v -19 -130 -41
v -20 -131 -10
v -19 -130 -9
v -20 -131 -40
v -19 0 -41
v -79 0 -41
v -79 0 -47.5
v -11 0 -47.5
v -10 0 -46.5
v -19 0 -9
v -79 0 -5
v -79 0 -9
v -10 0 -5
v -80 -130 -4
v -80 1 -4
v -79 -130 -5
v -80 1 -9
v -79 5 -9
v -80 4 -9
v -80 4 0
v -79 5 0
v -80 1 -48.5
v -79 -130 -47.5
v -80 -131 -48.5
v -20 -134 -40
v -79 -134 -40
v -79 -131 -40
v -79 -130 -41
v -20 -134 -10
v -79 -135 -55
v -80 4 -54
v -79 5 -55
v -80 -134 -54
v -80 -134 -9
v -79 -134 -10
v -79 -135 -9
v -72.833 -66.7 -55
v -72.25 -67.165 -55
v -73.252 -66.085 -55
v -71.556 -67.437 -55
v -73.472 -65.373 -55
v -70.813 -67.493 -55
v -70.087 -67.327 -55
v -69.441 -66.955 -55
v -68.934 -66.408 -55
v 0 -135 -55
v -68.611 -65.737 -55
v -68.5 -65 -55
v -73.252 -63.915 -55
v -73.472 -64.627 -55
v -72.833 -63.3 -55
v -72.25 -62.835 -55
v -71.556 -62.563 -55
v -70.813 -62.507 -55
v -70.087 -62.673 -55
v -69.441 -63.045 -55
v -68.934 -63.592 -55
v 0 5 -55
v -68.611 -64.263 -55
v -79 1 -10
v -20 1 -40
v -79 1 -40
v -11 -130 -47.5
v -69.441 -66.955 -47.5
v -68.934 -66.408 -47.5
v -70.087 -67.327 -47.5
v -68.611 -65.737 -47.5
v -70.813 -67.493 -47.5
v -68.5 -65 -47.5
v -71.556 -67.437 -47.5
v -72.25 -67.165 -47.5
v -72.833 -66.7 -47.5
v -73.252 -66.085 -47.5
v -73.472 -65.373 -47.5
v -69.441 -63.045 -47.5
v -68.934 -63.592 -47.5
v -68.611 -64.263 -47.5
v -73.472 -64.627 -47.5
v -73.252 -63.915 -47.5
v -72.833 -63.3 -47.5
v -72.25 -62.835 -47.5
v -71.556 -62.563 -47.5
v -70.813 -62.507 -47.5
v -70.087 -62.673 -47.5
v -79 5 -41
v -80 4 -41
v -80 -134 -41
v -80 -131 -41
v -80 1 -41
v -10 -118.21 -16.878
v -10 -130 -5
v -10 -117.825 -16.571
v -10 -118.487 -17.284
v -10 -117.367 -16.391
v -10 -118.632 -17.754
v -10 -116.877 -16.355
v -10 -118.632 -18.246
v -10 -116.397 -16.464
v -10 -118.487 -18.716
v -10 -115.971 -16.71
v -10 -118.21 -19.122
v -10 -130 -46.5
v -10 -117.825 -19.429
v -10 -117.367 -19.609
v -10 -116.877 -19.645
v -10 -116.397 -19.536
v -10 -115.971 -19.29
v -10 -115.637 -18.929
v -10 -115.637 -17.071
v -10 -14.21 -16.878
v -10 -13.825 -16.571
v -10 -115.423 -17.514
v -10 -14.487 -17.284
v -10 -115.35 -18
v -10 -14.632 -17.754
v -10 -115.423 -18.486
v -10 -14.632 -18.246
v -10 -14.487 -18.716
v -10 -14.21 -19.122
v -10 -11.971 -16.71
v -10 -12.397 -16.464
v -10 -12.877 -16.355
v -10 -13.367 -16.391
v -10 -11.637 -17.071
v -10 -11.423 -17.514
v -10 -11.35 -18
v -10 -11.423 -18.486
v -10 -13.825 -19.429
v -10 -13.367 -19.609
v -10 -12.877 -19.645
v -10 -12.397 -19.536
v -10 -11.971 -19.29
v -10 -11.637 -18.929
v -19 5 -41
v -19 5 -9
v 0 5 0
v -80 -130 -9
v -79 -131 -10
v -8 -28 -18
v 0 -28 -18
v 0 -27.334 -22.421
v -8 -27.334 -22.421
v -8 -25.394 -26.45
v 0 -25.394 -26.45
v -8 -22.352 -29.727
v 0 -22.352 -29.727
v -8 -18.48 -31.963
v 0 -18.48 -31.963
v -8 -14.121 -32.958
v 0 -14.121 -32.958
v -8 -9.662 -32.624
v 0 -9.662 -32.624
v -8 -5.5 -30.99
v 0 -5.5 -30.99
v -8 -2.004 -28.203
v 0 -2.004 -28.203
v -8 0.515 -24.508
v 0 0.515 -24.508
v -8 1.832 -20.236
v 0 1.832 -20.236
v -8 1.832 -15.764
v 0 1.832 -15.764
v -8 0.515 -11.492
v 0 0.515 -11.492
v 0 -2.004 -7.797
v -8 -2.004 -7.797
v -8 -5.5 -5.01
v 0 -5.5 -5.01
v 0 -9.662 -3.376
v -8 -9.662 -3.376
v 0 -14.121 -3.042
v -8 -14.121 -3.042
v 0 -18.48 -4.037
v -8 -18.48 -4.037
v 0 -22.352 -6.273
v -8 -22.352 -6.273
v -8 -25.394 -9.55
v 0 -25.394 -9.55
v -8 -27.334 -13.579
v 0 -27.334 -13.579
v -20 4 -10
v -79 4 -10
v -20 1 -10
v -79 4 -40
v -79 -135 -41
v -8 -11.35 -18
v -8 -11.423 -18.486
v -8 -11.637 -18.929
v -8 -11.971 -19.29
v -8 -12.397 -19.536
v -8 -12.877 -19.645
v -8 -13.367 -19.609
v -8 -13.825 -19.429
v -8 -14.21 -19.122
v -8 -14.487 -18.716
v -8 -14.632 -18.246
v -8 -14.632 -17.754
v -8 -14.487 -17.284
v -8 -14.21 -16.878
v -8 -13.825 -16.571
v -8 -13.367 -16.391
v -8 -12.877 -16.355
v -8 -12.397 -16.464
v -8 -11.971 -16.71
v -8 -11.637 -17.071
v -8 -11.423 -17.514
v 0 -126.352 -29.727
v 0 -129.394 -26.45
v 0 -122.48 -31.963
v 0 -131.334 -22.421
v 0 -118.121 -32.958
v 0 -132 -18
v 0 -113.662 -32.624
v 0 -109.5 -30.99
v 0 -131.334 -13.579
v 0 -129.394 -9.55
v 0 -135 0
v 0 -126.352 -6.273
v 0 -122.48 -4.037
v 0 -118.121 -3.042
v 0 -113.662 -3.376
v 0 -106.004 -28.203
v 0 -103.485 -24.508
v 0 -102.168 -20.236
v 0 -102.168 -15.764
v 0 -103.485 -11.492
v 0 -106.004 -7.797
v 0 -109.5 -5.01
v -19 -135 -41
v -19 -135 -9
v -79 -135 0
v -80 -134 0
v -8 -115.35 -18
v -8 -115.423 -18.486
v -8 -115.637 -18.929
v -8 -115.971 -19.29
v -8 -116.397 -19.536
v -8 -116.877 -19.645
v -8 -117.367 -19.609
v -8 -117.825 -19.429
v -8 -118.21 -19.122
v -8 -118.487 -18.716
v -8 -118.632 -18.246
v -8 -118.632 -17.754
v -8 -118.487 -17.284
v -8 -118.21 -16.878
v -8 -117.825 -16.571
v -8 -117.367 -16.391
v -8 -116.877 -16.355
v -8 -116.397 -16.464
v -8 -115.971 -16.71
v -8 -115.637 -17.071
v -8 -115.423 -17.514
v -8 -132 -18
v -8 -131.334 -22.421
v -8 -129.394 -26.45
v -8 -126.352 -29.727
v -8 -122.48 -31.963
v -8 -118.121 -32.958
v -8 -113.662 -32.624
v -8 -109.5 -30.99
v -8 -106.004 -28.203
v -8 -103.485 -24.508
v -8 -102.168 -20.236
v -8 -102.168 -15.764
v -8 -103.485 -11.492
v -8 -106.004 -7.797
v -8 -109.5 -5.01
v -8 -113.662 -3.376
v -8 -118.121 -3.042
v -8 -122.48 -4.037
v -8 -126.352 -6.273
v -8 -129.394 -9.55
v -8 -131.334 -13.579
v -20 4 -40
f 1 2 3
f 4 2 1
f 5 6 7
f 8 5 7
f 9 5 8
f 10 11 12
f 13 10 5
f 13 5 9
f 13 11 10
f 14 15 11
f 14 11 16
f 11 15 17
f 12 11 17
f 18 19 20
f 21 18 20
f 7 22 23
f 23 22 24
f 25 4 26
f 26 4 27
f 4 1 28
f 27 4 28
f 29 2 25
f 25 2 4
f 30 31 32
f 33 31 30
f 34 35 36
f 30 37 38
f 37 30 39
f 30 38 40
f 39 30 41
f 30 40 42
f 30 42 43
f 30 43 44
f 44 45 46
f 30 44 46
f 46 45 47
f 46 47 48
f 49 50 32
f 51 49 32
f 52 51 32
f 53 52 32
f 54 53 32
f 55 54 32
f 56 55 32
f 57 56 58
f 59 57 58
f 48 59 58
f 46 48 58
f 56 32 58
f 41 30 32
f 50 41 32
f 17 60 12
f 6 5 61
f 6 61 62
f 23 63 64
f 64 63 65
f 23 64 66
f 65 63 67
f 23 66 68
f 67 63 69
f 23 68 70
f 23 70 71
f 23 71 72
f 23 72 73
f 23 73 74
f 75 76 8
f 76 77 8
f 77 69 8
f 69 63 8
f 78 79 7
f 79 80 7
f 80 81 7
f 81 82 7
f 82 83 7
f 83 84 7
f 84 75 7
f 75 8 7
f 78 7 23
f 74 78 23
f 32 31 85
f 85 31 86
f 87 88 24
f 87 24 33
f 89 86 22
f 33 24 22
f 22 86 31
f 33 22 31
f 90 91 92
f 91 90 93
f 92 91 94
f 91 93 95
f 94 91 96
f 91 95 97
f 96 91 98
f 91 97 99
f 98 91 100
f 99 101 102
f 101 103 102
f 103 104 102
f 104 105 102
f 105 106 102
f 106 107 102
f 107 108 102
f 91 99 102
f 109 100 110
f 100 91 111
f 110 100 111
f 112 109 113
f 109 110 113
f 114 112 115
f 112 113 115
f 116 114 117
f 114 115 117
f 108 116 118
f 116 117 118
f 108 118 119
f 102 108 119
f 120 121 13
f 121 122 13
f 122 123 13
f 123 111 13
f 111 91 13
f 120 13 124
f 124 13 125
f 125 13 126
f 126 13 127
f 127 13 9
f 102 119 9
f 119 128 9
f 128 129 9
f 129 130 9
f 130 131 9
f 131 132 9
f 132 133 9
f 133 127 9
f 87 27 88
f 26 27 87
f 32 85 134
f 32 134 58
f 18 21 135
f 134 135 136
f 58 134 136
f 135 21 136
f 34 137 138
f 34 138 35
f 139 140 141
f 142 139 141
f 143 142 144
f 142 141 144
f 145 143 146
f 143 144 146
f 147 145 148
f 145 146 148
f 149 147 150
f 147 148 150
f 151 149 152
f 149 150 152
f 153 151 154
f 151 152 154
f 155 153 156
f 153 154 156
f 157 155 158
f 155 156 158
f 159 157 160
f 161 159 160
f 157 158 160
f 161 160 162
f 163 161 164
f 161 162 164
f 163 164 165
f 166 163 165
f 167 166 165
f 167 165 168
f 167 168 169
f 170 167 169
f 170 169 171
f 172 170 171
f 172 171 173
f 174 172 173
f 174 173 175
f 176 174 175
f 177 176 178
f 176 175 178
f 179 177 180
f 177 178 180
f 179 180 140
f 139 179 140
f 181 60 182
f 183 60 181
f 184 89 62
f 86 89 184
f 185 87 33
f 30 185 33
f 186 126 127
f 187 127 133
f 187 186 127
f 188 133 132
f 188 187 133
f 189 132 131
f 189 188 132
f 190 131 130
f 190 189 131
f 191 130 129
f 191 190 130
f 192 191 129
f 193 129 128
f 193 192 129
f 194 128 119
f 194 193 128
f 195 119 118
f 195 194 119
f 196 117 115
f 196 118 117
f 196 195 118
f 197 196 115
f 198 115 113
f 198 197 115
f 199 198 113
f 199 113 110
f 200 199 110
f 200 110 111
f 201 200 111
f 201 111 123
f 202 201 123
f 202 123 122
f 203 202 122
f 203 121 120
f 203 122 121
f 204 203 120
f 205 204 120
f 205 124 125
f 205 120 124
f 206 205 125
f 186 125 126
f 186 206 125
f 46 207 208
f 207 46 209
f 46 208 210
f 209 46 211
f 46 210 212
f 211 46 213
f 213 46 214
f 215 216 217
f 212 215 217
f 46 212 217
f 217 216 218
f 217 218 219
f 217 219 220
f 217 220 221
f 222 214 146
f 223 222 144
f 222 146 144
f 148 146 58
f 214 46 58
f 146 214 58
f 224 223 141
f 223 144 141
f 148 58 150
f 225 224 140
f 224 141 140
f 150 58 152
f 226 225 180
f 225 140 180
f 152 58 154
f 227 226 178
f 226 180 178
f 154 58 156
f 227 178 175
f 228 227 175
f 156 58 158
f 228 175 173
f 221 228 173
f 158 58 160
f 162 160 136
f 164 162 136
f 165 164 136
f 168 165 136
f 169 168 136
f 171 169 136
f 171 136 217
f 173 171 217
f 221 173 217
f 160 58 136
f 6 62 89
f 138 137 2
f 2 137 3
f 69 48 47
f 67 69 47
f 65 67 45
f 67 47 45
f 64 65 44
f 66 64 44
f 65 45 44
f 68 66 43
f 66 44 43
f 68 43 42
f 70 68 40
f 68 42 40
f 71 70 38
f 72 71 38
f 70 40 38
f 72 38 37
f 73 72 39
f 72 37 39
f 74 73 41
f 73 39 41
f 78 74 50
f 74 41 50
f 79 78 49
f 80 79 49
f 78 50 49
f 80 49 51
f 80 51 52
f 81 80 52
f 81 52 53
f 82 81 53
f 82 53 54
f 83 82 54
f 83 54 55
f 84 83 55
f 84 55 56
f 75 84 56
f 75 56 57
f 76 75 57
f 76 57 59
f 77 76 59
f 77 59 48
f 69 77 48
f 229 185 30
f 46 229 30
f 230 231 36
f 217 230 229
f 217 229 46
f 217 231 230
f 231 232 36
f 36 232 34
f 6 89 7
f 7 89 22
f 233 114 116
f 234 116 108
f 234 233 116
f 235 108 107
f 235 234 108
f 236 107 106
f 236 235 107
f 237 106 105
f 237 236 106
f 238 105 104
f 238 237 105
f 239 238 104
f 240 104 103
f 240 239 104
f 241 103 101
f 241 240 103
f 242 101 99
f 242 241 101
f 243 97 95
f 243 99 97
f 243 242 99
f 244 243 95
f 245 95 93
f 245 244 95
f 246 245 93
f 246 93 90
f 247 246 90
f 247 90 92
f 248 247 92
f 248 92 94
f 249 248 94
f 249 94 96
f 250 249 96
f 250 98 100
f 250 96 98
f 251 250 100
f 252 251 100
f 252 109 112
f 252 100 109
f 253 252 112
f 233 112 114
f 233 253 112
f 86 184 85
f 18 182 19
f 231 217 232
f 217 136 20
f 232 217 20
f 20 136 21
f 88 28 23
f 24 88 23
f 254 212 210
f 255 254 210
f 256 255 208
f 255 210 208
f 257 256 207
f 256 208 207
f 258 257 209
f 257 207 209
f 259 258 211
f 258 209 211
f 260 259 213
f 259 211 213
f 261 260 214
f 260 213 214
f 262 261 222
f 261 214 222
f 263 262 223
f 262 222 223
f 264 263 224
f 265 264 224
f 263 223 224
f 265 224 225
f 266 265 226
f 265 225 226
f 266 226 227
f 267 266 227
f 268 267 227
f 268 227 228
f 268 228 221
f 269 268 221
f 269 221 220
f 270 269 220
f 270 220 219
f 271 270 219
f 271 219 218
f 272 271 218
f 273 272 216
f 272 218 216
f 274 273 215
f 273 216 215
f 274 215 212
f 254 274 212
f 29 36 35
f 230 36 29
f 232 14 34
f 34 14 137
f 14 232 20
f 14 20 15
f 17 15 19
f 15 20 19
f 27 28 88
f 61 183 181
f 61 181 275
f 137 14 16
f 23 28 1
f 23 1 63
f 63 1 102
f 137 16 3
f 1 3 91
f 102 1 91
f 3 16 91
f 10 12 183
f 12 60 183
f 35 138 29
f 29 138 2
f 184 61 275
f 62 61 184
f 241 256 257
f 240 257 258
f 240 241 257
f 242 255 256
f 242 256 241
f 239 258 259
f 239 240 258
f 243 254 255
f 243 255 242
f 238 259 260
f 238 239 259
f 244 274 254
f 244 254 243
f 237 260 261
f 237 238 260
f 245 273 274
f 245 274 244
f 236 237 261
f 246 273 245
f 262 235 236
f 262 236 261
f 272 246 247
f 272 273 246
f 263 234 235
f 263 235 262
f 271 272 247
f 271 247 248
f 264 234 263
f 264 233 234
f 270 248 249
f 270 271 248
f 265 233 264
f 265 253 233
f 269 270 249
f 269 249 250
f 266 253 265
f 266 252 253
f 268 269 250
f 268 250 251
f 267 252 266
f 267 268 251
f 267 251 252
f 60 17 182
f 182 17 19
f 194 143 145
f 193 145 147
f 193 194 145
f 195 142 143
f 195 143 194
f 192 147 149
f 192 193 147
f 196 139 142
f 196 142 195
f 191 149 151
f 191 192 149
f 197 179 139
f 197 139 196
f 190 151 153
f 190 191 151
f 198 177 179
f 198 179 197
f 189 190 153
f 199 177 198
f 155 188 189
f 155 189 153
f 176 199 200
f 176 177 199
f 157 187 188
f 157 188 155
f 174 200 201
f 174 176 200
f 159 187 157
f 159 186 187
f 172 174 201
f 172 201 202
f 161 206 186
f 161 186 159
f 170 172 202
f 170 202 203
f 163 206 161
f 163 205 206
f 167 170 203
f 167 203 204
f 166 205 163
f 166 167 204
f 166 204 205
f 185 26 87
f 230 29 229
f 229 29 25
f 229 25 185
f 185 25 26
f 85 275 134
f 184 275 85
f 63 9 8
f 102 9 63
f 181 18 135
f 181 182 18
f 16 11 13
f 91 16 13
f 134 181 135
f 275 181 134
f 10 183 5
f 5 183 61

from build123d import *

# Parameters (mm, degrees)
F1_DEPTH  = 130
F2_DEPTH  = 5
F4_DEPTH  = 5
F5_SIZE   = 1
F7_DEPTH  = 8
F8_DEPTH  = 20
F10_DEPTH = 10


with BuildPart() as f1:
    # F0 (on Front) → F1 (new body)
    with BuildSketch(Plane.XZ):
        Polygon((0, -55), (0, 0), (-80, 0), (-80, -5), (-10, -5), (-10, -47.5), (-80, -47.5), (-80, -55), align=None)
    extrude(amount=F1_DEPTH)

    # F0 (on Front) + F1_face (on face) → F2 (join)
    with BuildSketch(Plane.XZ):
        Polygon((0, -55), (0, 0), (-80, 0), (-80, -5), (-10, -5), (-10, -47.5), (-80, -47.5), (-80, -55), align=None)
        Polygon((-10, -5), (-80, -5), (-80, -10), (-20, -10), (-20, -40), (-80, -40), (-80, -47.5), (-10, -47.5), align=None)
    with BuildSketch(Plane(origin=(-29.5614035088, 0, -30.1096491228), x_dir=(1, 0, 0), z_dir=(0, 1, 0))):
        Polygon((29.5614035088, -30.1096491228), (29.5614035088, 24.8903508772), (-50.4385964912, 24.8903508772), (-50.4385964912, 17.3903508772), (19.5614035088, 17.3903508772), (19.5614035088, -25.1096491228), (-50.4385964912, -25.1096491228), (-50.4385964912, -30.1096491228), align=None)
    extrude(amount=-F2_DEPTH, dir=(0, -1, 0))

    # F3 (on face) → F4 (join)
    with BuildSketch(Plane.XZ.offset(130)):
        Polygon((-10, -5), (-80, -5), (-80, -10), (-20, -10), (-20, -40), (-80, -40), (-80, -47.5), (-10, -47.5), align=None)
        Polygon((-80, 0), (-80, -5), (-10, -5), (-10, -47.5), (-80, -47.5), (-80, -55), (0, -55), (0, 0), align=None)
    extrude(amount=F4_DEPTH)

    # F5
    f5_edges = [f1.edges().sort_by_distance(p)[0] for p in [
        (-50, -135, -40),
        (-20, -135, -25),
        (-50, -135, -10),
        (-50, -130, -40),
        (-20, -130, -25),
        (-50, -130, -10),
        (-50, 0, -10),
        (-50, 5, -10),
        (-20, 0, -25),
        (-20, 5, -25),
        (-50, 5, -40),
        (-80, 2.5, -40),
        (-50, 0, -40),
        (-80, 2.5, -10),
        (-80, -130, -43.75),
        (-10, -65, -47.5),
        (-80, -65, -5),
        (-80, 0, -7.5),
        (-80, -65, -47.5),
        (-80, 0, -43.75),
        (-80, 5, -47.5),
        (-80, -132.5, -40),
        (-80, -135, -47.5),
        (-80, -65, -55),
        (-80, -132.5, -10),
        (-80, 5, -5),
        (-80, -135, -5),
    ]]
    chamfer(f5_edges, length=F5_SIZE)

    # F6 (on face) → F7 (cut)
    with BuildSketch(Plane.YZ):
        with BuildLine():
            ThreePointArc((-118.65, -18), (-117, -16.35), (-115.35, -18))
            Line((-115.35, -18), (-102, -18))
            ThreePointArc((-102, -18), (-117, -3), (-132, -18))
            Line((-132, -18), (-118.65, -18))
        make_face()
        with BuildLine():
            Line((-102, -18), (-115.35, -18))
            ThreePointArc((-115.35, -18), (-117, -19.65), (-118.65, -18))
            Line((-118.65, -18), (-132, -18))
            ThreePointArc((-132, -18), (-117, -33), (-102, -18))
        make_face()
        with BuildLine():
            ThreePointArc((2, -18), (-13, -3), (-28, -18))
            Line((-28, -18), (-14.65, -18))
            ThreePointArc((-14.65, -18), (-13, -16.35), (-11.35, -18))
            Line((-11.35, -18), (2, -18))
        make_face()
        with BuildLine():
            Line((-14.65, -18), (-28, -18))
            ThreePointArc((-28, -18), (-13, -33), (2, -18))
            Line((2, -18), (-11.35, -18))
            ThreePointArc((-11.35, -18), (-13, -19.65), (-14.65, -18))
        make_face()
    extrude(amount=-F7_DEPTH, mode=Mode.SUBTRACT)

    # F8 (cut): faces of the model
    f8_faces = [f1.faces().sort_by_distance(p)[0] for p in [
        (0, -13, -18),
        (0, -117, -18),
    ]]
    extrude(f8_faces, amount=-F8_DEPTH, mode=Mode.SUBTRACT)

    # F9 (on face) → F10 (cut)
    with BuildSketch(Plane(origin=(0, 0, -55), x_dir=(1, 0, 0), z_dir=(0, 0, -1))):
        with BuildLine():
            ThreePointArc((-73.5, 65), (-71, 62.5), (-68.5, 65))
            ThreePointArc((-68.5, 65), (-71, 67.5), (-73.5, 65))
        make_face()
    extrude(amount=-F10_DEPTH, mode=Mode.SUBTRACT)


solid = f1.part
